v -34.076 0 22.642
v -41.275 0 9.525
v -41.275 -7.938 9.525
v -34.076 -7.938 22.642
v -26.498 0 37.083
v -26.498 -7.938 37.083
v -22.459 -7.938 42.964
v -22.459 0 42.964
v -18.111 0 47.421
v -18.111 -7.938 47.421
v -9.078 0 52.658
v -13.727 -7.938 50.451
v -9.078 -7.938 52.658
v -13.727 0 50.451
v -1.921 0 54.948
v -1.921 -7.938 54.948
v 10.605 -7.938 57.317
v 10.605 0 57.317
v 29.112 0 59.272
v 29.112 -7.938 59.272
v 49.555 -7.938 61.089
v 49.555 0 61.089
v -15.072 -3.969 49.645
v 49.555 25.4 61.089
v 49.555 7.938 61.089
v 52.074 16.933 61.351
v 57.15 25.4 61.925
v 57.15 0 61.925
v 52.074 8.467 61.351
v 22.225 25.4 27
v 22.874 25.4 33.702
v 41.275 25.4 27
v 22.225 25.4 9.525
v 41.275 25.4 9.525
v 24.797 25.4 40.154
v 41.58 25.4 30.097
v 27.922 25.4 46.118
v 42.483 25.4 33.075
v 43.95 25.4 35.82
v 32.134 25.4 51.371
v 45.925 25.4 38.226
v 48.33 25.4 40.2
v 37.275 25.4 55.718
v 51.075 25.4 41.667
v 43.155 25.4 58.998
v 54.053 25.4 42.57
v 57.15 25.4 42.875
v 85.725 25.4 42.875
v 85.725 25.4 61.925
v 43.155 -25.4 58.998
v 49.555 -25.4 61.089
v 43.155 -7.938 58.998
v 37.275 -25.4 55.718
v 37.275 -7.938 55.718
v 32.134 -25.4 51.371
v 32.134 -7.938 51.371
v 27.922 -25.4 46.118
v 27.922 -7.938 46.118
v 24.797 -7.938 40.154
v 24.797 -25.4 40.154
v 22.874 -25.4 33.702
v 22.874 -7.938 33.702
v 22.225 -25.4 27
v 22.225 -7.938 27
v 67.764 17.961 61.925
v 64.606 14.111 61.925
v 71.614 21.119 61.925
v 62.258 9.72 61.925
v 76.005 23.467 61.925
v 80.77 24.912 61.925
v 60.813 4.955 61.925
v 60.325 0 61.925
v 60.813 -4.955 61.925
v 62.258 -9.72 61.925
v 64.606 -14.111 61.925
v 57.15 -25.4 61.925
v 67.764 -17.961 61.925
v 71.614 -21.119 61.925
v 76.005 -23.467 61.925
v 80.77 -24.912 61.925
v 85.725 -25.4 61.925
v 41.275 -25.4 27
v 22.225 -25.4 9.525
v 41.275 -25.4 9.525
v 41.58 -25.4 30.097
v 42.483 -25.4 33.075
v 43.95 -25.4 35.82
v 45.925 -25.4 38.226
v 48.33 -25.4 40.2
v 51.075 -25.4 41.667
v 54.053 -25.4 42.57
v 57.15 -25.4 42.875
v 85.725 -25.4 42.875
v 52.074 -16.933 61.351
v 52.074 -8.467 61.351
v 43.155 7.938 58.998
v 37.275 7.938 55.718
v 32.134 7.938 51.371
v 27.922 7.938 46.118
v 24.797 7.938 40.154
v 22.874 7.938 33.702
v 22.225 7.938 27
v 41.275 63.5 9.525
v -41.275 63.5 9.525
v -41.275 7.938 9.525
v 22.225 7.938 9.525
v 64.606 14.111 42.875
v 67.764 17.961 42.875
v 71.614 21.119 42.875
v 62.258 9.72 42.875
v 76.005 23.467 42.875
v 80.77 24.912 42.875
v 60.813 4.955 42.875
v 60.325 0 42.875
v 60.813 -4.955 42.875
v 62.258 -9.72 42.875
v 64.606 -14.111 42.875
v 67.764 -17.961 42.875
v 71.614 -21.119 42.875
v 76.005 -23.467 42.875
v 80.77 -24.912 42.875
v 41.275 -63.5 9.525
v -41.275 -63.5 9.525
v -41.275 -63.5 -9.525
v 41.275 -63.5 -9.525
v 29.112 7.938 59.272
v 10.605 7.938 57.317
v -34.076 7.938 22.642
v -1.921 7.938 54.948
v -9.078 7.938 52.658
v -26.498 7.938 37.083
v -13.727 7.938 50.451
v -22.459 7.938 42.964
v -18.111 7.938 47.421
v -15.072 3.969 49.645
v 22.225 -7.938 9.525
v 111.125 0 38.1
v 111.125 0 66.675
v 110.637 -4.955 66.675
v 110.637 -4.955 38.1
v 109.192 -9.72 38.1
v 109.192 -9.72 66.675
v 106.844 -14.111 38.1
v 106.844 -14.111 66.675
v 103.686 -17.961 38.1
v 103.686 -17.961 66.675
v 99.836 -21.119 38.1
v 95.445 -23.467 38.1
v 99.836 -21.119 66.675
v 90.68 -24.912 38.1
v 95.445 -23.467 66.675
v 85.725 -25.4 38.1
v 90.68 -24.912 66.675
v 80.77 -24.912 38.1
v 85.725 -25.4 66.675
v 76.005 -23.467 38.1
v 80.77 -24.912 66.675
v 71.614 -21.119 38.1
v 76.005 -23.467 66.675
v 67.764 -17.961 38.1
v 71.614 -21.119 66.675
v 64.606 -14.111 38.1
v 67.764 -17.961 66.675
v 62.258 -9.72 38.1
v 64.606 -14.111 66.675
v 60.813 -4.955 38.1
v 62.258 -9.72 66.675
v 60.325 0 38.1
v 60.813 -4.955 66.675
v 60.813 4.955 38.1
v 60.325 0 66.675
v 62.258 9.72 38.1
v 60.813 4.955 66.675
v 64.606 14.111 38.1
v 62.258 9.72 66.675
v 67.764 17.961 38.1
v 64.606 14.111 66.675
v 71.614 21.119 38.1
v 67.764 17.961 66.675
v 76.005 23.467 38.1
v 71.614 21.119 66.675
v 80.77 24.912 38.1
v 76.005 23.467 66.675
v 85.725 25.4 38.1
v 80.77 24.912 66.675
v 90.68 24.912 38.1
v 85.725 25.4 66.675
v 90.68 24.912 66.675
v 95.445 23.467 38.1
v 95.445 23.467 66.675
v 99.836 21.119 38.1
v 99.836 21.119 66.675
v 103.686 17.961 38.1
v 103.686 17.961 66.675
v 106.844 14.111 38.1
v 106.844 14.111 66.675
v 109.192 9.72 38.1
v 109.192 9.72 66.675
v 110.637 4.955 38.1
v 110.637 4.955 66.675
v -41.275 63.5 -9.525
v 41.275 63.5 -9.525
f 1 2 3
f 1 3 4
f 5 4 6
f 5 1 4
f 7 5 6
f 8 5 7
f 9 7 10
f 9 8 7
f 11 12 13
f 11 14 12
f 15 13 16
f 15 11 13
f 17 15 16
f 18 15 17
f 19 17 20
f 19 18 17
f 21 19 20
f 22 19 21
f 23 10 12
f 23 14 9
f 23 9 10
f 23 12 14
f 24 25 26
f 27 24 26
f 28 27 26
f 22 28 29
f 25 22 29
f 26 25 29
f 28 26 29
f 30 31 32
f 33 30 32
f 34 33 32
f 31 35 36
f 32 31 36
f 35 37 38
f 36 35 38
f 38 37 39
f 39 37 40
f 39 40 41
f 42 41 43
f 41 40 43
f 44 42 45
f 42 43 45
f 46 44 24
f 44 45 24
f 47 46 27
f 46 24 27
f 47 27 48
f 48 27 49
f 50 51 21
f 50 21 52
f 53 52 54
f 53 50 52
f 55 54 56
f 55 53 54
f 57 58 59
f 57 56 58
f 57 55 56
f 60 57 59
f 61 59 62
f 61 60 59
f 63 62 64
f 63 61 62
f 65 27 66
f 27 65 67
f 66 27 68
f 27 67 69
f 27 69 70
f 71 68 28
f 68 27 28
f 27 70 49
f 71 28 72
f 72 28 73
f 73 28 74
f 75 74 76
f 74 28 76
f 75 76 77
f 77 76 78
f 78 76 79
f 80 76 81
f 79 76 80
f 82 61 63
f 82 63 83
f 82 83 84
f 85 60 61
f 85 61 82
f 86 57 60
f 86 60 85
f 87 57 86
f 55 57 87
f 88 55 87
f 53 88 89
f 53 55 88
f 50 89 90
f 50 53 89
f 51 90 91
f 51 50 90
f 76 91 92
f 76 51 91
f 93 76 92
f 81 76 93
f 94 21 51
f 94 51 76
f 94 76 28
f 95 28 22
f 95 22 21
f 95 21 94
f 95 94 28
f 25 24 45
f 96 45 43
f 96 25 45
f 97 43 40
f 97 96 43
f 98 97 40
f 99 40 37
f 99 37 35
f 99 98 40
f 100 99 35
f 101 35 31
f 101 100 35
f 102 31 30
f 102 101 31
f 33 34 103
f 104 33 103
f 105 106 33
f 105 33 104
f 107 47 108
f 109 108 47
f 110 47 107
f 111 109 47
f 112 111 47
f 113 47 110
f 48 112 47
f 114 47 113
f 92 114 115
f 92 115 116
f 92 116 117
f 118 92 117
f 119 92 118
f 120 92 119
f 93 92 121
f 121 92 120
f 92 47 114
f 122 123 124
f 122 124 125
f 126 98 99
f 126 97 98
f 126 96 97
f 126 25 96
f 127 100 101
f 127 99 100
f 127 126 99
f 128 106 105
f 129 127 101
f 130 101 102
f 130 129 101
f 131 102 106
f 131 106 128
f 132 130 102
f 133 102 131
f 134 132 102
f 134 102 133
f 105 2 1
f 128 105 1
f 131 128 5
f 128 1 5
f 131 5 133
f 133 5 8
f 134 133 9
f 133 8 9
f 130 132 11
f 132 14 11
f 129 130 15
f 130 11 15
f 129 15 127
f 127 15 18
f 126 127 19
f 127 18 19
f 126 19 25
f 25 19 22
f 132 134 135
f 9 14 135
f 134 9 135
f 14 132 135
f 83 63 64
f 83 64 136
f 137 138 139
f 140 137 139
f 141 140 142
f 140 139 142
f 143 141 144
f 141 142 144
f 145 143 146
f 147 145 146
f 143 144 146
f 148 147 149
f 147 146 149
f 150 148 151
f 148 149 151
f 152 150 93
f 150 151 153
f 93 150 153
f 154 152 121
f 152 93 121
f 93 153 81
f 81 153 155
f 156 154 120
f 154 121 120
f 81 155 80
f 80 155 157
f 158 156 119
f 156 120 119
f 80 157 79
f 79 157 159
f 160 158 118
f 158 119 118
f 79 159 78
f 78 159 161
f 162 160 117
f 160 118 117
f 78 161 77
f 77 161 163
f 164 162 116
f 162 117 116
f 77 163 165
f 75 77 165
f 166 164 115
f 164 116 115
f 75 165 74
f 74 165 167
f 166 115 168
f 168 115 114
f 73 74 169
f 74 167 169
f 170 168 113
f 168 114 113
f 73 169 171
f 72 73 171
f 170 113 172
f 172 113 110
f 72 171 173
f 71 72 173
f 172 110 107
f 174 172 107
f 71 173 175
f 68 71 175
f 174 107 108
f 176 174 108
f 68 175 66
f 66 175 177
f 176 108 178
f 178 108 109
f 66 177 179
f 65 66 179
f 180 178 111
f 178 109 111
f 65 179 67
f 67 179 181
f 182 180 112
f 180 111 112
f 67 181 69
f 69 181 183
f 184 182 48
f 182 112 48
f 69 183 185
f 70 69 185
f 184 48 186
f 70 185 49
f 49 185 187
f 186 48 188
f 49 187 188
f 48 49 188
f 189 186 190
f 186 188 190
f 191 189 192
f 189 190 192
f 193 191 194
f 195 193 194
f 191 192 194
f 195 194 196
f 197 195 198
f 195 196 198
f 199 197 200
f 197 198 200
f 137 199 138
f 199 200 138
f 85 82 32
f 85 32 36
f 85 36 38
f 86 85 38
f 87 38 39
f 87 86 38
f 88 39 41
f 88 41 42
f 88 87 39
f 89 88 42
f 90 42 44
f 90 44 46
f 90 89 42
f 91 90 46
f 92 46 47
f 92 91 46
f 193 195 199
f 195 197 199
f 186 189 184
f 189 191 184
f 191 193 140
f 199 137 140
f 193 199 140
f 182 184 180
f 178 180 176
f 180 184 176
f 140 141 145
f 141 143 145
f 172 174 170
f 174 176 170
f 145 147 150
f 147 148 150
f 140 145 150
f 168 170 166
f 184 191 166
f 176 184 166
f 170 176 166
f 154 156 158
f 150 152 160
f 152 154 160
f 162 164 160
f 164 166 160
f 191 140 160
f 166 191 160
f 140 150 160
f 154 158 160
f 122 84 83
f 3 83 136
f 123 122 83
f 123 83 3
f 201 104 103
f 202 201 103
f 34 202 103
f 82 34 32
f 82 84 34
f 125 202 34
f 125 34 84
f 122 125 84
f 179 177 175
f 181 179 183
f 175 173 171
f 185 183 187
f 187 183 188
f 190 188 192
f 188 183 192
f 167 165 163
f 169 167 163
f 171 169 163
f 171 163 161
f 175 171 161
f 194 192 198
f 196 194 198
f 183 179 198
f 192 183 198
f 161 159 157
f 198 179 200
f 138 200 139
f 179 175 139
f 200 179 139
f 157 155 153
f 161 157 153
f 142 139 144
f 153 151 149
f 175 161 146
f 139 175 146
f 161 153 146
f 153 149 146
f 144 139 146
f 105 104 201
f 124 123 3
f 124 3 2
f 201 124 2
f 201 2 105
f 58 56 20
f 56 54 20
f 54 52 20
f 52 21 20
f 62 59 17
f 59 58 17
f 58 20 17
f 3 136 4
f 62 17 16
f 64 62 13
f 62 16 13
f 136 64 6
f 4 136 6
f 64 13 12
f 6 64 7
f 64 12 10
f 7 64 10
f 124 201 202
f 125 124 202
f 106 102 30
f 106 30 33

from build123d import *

# Parameters (mm, degrees)
F1_DEPTH = 63.5
F2_DEPTH = 25.4
F3_DEPTH = 7.9375
F0_W     = 25.4
F0_H     = 19.05
F4_DEPTH = 25.4


# Not quite as in the source:
# - a feature names something its author has since deleted; it is built from what else it names


with BuildPart() as f1:
    # F0 (on Front) → F1 (new body, symmetric)
    with BuildSketch(Plane.XZ):
        Polygon((-41.275, 9.525), (-41.275, -9.525), (41.275, -9.525), (41.275, 9.525), (22.225, 9.525), align=None)
    extrude(amount=F1_DEPTH, both=True)

    # F0 (on Front) → F2 (join, symmetric)
    with BuildSketch(Plane.XZ):
        with BuildLine():
            Line((22.225, 9.525), (41.275, 9.525))
            Line((41.275, 9.525), (41.275, 27.0002))
            ThreePointArc((41.275, 27.0002), (45.9246798487, 38.2255201513), (57.15, 42.8752))
            Line((57.15, 42.8752), (60.325, 42.8752))
            Line((60.325, 42.8752), (60.325, 61.9252))
            Line((60.325, 61.9252), (57.15, 61.9252))
            add(Edge.make_bspline(
                [(49.5546191044, 61.0892864361), (52.0673413898, 61.343380394), (54.6014869269, 61.6190974593), (57.15, 61.9252)],
                knots=[0.9527141081, 0.9527141081, 0.9527141081, 0.9527141081, 1, 1, 1, 1], degree=3))
            ThreePointArc((49.5546191044, 61.0892864361), (29.9009238434, 48.8461029022), (22.225, 27.0002))
            Line((22.225, 27.0002), (22.225, 9.525))
        make_face()
    extrude(amount=F2_DEPTH, both=True)

    # F0 (on Front) → F3 (join, symmetric)
    with BuildSketch(Plane.XZ):
        with BuildLine():
            add(Edge.make_bspline(
                [(-41.275, 9.525), (-30.0133153796, 28.1962957233), (-23.3223965861, 57.9111150093), (22.6888247137, 58.3725373278), (49.5546191044, 61.0892864361)],
                knots=[0, 0, 0, 0, 0.4471377236, 0.9527141081, 0.9527141081, 0.9527141081, 0.9527141081], degree=3))
            Line((-41.275, 9.525), (22.225, 9.525))
            Line((22.225, 9.525), (22.225, 27.0002))
            ThreePointArc((22.225, 27.0002), (29.9009238434, 48.8461029022), (49.5546191044, 61.0892864361))
        make_face()
    extrude(amount=F3_DEPTH, both=True)

    # F0 (on Front) → F4 (join, symmetric)
    with BuildSketch(Plane.XZ):
        with Locations((73.025, 52.4002)):
            Rectangle(F0_W, F0_H)
    extrude(amount=F4_DEPTH, both=True)

    # F0 (on Front) → F5 (revolve)
    with BuildSketch(Plane.XZ):
        Polygon((85.725, 66.675), (85.725, 61.9252), (85.725, 42.8752), (85.725, 38.1), (111.125, 38.1), (111.125, 66.675), align=None)
    revolve(axis=Axis((85.725, 0, 52.3875), (0, 0, -1)))


solid = f1.part
